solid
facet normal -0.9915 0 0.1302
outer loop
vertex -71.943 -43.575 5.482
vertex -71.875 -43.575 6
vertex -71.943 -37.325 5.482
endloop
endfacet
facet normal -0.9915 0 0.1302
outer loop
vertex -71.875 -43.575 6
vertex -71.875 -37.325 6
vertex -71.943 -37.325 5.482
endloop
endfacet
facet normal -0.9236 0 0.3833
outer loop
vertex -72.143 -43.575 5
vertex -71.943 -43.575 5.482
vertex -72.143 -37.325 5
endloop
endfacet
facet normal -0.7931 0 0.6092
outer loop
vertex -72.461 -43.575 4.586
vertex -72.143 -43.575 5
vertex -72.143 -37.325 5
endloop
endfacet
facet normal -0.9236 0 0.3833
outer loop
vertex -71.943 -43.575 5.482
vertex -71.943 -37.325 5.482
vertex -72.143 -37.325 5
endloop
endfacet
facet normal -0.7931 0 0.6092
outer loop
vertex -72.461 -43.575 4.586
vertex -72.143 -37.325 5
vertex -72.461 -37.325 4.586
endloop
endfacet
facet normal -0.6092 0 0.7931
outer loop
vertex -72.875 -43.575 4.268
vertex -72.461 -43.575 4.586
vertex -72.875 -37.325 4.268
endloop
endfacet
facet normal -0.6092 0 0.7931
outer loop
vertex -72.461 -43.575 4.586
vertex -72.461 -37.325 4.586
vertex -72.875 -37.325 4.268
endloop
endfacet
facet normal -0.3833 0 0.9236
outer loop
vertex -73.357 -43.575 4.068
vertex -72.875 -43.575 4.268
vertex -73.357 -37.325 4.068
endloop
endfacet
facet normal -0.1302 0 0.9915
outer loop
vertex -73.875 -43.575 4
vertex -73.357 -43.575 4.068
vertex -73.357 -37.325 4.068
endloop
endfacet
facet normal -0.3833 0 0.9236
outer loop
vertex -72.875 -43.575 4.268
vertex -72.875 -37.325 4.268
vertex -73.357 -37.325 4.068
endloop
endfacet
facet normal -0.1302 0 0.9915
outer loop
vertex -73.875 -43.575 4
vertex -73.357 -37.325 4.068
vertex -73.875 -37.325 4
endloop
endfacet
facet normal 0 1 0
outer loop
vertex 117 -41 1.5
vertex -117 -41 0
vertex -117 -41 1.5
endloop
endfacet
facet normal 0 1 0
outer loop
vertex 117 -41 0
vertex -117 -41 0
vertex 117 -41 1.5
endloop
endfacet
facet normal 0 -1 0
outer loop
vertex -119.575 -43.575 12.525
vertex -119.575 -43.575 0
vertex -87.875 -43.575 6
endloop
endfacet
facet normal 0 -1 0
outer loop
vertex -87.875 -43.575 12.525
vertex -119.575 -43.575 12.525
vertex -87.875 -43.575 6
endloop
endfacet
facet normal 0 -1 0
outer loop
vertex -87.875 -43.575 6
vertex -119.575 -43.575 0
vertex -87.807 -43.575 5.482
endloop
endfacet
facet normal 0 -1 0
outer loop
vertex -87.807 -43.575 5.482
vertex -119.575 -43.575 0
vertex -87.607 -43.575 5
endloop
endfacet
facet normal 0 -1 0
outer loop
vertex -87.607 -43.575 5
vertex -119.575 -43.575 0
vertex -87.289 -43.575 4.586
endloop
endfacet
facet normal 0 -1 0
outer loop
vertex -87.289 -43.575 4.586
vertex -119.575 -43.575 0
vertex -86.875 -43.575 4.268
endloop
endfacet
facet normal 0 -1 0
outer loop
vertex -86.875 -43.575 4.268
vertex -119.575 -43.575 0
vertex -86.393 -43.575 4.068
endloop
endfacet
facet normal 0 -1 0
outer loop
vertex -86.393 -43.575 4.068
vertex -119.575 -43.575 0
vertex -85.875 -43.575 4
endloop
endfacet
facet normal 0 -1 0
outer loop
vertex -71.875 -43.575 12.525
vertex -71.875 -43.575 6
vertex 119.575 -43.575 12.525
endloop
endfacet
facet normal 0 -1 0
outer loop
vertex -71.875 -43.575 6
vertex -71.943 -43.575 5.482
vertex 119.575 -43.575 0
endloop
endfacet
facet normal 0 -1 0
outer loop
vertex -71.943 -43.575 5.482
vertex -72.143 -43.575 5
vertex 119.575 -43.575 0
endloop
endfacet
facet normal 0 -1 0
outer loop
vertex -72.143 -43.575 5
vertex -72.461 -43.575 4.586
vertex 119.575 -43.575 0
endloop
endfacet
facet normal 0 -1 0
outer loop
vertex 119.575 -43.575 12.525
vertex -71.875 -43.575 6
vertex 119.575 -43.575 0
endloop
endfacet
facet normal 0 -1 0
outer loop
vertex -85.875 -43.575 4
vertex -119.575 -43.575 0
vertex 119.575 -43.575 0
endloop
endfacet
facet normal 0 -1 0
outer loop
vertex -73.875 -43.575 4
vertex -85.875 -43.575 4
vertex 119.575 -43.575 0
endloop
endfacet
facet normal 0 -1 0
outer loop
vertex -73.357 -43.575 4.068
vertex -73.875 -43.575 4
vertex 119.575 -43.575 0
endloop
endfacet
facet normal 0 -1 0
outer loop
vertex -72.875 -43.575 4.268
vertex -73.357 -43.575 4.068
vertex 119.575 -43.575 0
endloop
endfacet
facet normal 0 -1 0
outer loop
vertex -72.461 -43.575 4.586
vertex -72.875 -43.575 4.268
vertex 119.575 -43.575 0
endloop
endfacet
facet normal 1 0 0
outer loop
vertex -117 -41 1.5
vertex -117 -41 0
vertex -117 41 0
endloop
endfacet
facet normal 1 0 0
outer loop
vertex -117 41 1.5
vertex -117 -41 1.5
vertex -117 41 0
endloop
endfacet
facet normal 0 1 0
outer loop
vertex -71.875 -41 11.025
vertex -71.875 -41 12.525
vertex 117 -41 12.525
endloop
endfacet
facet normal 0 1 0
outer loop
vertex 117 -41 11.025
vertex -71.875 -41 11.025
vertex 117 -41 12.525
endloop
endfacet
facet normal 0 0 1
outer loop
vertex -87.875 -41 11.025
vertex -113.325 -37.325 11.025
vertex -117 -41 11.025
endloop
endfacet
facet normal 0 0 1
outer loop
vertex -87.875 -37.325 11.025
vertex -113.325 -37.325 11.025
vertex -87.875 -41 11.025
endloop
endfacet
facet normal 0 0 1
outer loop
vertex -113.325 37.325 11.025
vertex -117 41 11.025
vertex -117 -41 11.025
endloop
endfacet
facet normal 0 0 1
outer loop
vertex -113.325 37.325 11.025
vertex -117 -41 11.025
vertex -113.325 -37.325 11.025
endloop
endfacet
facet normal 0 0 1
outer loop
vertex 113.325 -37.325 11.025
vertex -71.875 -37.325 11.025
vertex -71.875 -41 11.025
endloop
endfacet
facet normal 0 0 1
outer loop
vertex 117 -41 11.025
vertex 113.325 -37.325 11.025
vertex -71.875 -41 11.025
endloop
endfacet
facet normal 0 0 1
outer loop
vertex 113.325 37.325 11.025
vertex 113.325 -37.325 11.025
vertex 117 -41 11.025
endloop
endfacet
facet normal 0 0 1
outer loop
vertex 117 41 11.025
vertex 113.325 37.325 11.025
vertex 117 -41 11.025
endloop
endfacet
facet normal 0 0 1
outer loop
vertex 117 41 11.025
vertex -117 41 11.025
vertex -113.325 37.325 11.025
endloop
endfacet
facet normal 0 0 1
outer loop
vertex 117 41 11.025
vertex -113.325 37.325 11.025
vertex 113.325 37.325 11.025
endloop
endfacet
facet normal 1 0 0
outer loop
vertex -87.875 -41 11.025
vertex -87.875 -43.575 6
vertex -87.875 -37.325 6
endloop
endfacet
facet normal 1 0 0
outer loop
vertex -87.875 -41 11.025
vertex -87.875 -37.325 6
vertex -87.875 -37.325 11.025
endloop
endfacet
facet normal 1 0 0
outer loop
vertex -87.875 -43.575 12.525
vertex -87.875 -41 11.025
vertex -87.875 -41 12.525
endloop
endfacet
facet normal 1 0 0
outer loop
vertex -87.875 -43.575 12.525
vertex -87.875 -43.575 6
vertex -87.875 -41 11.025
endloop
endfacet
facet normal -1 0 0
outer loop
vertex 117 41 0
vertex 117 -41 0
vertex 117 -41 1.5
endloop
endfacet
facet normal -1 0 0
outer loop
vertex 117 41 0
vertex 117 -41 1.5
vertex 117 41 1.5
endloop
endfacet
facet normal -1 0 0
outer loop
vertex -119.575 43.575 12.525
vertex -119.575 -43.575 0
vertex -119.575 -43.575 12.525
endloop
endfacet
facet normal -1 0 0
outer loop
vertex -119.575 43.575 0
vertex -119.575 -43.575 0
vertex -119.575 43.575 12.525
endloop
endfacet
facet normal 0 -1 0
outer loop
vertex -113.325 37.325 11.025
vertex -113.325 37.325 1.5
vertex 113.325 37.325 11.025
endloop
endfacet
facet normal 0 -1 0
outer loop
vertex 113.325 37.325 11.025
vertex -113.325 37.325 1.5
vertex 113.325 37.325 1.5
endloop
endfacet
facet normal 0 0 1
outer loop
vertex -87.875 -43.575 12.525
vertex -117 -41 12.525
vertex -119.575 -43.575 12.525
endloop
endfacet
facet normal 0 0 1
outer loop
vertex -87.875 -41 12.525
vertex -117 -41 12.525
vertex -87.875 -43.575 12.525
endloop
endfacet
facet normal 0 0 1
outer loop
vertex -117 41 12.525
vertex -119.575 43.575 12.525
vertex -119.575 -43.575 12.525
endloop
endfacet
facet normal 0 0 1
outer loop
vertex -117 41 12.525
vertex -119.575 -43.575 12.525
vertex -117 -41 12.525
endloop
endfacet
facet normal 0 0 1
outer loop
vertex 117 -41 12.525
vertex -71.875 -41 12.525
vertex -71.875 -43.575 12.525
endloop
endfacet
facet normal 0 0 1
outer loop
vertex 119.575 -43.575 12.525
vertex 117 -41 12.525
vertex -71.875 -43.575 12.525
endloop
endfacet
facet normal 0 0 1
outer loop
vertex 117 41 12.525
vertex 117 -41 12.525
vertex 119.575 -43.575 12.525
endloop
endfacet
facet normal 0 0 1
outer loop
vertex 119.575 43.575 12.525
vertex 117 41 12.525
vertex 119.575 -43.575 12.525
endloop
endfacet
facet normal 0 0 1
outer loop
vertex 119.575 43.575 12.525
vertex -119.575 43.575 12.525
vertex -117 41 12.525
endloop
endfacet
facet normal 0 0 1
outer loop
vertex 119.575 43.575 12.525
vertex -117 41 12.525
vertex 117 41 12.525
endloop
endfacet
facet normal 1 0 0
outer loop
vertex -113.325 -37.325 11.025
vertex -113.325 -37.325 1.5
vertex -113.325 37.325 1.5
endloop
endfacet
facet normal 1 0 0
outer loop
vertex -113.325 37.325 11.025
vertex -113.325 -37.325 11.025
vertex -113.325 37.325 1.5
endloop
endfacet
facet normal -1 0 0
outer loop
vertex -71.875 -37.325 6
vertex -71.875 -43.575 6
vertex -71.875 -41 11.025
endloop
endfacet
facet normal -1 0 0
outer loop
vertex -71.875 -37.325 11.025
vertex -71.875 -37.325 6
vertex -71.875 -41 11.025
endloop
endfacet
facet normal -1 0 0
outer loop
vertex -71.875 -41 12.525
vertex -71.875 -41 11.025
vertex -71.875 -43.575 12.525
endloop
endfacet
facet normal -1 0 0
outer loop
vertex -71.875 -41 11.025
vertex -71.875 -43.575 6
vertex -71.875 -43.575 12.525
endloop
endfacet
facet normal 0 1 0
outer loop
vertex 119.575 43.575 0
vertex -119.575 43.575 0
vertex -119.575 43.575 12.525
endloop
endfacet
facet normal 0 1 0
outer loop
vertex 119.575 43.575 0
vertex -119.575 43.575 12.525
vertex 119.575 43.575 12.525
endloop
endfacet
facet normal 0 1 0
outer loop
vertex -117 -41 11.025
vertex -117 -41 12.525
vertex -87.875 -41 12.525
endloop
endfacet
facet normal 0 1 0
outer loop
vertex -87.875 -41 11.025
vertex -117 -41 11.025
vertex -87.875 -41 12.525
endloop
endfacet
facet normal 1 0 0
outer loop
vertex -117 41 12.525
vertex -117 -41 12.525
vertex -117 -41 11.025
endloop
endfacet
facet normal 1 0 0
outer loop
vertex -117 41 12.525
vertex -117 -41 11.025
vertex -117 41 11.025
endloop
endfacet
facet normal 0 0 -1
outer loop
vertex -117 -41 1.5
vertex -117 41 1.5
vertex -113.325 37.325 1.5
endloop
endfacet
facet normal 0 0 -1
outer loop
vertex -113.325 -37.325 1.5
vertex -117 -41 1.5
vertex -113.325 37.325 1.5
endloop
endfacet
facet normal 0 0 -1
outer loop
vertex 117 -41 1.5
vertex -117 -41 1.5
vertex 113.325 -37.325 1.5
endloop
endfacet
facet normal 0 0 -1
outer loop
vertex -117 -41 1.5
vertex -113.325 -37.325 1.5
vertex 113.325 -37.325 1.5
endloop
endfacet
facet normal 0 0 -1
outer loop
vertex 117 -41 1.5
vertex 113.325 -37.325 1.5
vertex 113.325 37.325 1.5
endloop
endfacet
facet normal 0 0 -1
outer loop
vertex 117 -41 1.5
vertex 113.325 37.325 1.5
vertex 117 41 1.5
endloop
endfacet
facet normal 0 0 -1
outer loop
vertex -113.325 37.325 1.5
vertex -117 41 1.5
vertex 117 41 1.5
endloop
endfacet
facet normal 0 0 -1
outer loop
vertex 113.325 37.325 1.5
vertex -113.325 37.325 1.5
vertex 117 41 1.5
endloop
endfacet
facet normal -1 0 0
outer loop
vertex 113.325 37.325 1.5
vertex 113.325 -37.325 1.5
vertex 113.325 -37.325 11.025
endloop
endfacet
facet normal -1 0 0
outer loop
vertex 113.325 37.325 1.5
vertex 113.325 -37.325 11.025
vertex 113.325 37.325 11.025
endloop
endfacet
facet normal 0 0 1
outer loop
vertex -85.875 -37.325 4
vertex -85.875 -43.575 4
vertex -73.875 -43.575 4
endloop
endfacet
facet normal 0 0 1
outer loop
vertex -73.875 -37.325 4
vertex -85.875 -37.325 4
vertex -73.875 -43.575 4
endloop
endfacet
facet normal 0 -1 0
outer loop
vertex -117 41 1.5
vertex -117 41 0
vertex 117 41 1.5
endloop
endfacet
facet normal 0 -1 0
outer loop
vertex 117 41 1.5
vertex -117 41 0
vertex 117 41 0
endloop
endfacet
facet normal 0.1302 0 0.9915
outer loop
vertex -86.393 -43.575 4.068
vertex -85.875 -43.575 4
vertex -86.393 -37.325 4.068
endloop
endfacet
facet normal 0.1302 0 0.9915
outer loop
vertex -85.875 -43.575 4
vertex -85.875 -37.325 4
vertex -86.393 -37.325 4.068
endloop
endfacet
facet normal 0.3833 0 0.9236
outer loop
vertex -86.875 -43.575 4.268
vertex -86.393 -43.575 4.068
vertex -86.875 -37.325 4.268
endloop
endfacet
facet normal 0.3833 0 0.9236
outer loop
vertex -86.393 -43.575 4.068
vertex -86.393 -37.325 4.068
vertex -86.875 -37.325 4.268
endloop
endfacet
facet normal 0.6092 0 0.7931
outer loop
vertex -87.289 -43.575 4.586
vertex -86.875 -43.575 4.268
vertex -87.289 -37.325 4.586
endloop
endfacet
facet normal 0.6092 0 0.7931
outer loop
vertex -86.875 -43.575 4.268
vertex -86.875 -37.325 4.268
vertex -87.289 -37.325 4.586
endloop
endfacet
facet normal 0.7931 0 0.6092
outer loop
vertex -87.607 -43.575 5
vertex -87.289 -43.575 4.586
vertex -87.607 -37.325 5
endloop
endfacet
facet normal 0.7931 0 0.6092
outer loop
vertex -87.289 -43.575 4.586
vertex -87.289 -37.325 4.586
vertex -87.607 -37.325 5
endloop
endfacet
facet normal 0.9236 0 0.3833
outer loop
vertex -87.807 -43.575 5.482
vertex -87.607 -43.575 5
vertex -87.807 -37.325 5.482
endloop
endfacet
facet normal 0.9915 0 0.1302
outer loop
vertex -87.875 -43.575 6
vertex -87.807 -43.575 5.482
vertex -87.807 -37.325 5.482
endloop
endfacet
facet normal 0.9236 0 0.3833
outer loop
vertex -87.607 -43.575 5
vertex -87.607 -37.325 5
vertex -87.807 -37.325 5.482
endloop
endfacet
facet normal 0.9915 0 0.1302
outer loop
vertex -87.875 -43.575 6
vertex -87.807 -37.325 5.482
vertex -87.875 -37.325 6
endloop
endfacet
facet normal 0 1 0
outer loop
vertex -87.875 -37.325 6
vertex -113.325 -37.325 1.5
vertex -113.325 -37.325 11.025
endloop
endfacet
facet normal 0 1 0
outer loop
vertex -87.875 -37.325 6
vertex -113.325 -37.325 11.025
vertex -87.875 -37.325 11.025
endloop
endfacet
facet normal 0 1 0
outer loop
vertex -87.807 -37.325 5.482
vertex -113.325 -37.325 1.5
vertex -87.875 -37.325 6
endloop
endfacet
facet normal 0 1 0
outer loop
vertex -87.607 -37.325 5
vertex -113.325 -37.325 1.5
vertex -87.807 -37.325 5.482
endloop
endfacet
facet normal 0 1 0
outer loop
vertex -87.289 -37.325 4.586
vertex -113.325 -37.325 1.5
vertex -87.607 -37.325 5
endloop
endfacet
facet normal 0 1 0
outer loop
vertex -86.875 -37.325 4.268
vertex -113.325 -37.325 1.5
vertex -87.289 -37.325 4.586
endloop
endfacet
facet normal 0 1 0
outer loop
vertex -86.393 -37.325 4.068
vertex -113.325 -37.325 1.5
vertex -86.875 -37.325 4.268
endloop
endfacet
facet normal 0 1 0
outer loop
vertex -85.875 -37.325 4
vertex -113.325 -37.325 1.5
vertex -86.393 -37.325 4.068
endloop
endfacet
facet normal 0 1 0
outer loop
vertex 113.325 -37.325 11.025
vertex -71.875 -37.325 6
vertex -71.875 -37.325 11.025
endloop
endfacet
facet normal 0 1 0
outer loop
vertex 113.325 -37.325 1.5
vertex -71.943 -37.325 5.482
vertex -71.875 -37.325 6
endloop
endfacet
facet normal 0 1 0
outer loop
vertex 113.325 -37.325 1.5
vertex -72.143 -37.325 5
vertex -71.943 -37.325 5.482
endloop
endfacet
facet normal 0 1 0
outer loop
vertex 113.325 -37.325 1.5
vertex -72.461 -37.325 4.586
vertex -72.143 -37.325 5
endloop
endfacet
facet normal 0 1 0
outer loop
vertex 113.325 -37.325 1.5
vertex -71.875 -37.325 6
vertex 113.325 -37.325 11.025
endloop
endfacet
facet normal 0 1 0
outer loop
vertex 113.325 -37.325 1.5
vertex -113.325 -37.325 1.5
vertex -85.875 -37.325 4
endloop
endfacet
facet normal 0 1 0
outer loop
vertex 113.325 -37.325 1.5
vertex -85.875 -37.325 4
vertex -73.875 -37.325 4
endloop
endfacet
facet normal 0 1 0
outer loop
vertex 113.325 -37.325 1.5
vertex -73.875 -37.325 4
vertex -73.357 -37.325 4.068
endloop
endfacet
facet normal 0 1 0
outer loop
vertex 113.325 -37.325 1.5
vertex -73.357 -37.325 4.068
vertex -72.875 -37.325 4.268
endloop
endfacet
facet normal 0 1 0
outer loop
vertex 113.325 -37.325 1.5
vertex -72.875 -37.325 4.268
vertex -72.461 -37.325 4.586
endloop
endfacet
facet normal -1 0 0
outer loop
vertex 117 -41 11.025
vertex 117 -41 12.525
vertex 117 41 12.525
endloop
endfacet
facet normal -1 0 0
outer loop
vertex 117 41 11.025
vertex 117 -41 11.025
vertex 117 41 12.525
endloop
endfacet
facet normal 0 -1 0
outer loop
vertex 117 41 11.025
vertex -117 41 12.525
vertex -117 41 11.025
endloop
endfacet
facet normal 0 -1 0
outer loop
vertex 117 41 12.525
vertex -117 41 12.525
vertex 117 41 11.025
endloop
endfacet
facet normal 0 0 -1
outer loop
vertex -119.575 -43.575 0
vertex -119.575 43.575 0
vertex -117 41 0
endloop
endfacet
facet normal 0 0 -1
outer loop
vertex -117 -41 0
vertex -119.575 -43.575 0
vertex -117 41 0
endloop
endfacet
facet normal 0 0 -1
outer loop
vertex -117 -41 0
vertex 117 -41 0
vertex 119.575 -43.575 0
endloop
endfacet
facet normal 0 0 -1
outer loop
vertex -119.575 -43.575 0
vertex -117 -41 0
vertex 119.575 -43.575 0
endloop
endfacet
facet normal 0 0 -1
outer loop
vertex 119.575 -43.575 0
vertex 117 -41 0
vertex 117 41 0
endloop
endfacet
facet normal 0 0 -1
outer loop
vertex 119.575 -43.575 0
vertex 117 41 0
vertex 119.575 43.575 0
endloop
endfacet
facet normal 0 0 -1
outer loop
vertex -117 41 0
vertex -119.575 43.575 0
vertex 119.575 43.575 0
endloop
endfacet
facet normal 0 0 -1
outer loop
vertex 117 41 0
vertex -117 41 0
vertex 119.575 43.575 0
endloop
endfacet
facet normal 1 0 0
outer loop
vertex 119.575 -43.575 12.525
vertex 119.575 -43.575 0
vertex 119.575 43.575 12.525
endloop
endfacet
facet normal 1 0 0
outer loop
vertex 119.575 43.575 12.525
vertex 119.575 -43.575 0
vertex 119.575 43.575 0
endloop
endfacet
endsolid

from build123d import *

# Parameters (mm, degrees)
F0_W     = 239.15
F0_H     = 87.15
F0_W_2   = 234
F0_H_2   = 82
F0_W_3   = 233
F0_H_3   = 81
F0_W_4   = 226.65
F0_H_4   = 74.65
F1_DEPTH = 12.525
F2_W     = 234
F2_H     = 82
F2_W_2   = 233
F2_H_2   = 81
F2_W_3   = 226.65
F2_H_3   = 74.65
F3_DEPTH = 1.5
F4_W     = 234
F4_H     = 82
F4_W_2   = 233
F4_H_2   = 81
F4_W_3   = 226.65
F4_H_3   = 74.65
F5_DEPTH = 1.5
F6_W     = 16
F6_H     = 9
F7_DEPTH = 10
F8_R     = 2


# Not quite as in the source:
# - a pattern or mirror of a feature is missing from the dataset's text; its kind, count and spacing are read off the source's solid


with BuildPart() as f1:
    # F0 (on Top) → F1 (new body)
    with BuildSketch(Plane.XY):
        Rectangle(F0_W, F0_H)
        Rectangle(F0_W_2, F0_H_2, mode=Mode.SUBTRACT)
        Rectangle(F0_W_2, F0_H_2)
        Rectangle(F0_W_3, F0_H_3, mode=Mode.SUBTRACT)
        Rectangle(F0_W_3, F0_H_3)
        Rectangle(F0_W_4, F0_H_4, mode=Mode.SUBTRACT)
    extrude(amount=F1_DEPTH)

    # F2 (on face) → F3 (cut)
    with BuildSketch(Plane.XY.offset(12.525)):
        Rectangle(F2_W, F2_H)
        Rectangle(F2_W_2, F2_H_2, mode=Mode.SUBTRACT)
        Rectangle(F2_W_2, F2_H_2)
        Rectangle(F2_W_3, F2_H_3, mode=Mode.SUBTRACT)
    f3 = extrude(amount=-F3_DEPTH, mode=Mode.SUBTRACT)

    # F3_copies: F3 across plane
    add(f3.mirror(Plane(origin=(0, 0, 6.2625), x_dir=(-1, 0, 0), z_dir=(0, 0, -1))), mode=Mode.SUBTRACT)

    # F4 (on face) → F5 (cut)
    with BuildSketch(Plane.XY):
        Rectangle(F4_W, F4_H)
        Rectangle(F4_W_2, F4_H_2, mode=Mode.SUBTRACT)
        Rectangle(F4_W_2, F4_H_2)
        Rectangle(F4_W_3, F4_H_3, mode=Mode.SUBTRACT)
    extrude(amount=-F5_DEPTH, mode=Mode.SUBTRACT)

    # F6 (on face) → F7 (cut)
    with BuildSketch(Plane.XZ.offset(43.575)):
        with Locations((-79.875, 8.5)):
            Rectangle(F6_W, F6_H)
    extrude(amount=-F7_DEPTH, mode=Mode.SUBTRACT)

    # F8
    f8_edges = [f1.edges().sort_by_distance(p)[0] for p in [
        (-71.875, -40.45, 4),
        (-87.875, -40.45, 4),
    ]]
    fillet(f8_edges, radius=F8_R)


solid = f1.part
